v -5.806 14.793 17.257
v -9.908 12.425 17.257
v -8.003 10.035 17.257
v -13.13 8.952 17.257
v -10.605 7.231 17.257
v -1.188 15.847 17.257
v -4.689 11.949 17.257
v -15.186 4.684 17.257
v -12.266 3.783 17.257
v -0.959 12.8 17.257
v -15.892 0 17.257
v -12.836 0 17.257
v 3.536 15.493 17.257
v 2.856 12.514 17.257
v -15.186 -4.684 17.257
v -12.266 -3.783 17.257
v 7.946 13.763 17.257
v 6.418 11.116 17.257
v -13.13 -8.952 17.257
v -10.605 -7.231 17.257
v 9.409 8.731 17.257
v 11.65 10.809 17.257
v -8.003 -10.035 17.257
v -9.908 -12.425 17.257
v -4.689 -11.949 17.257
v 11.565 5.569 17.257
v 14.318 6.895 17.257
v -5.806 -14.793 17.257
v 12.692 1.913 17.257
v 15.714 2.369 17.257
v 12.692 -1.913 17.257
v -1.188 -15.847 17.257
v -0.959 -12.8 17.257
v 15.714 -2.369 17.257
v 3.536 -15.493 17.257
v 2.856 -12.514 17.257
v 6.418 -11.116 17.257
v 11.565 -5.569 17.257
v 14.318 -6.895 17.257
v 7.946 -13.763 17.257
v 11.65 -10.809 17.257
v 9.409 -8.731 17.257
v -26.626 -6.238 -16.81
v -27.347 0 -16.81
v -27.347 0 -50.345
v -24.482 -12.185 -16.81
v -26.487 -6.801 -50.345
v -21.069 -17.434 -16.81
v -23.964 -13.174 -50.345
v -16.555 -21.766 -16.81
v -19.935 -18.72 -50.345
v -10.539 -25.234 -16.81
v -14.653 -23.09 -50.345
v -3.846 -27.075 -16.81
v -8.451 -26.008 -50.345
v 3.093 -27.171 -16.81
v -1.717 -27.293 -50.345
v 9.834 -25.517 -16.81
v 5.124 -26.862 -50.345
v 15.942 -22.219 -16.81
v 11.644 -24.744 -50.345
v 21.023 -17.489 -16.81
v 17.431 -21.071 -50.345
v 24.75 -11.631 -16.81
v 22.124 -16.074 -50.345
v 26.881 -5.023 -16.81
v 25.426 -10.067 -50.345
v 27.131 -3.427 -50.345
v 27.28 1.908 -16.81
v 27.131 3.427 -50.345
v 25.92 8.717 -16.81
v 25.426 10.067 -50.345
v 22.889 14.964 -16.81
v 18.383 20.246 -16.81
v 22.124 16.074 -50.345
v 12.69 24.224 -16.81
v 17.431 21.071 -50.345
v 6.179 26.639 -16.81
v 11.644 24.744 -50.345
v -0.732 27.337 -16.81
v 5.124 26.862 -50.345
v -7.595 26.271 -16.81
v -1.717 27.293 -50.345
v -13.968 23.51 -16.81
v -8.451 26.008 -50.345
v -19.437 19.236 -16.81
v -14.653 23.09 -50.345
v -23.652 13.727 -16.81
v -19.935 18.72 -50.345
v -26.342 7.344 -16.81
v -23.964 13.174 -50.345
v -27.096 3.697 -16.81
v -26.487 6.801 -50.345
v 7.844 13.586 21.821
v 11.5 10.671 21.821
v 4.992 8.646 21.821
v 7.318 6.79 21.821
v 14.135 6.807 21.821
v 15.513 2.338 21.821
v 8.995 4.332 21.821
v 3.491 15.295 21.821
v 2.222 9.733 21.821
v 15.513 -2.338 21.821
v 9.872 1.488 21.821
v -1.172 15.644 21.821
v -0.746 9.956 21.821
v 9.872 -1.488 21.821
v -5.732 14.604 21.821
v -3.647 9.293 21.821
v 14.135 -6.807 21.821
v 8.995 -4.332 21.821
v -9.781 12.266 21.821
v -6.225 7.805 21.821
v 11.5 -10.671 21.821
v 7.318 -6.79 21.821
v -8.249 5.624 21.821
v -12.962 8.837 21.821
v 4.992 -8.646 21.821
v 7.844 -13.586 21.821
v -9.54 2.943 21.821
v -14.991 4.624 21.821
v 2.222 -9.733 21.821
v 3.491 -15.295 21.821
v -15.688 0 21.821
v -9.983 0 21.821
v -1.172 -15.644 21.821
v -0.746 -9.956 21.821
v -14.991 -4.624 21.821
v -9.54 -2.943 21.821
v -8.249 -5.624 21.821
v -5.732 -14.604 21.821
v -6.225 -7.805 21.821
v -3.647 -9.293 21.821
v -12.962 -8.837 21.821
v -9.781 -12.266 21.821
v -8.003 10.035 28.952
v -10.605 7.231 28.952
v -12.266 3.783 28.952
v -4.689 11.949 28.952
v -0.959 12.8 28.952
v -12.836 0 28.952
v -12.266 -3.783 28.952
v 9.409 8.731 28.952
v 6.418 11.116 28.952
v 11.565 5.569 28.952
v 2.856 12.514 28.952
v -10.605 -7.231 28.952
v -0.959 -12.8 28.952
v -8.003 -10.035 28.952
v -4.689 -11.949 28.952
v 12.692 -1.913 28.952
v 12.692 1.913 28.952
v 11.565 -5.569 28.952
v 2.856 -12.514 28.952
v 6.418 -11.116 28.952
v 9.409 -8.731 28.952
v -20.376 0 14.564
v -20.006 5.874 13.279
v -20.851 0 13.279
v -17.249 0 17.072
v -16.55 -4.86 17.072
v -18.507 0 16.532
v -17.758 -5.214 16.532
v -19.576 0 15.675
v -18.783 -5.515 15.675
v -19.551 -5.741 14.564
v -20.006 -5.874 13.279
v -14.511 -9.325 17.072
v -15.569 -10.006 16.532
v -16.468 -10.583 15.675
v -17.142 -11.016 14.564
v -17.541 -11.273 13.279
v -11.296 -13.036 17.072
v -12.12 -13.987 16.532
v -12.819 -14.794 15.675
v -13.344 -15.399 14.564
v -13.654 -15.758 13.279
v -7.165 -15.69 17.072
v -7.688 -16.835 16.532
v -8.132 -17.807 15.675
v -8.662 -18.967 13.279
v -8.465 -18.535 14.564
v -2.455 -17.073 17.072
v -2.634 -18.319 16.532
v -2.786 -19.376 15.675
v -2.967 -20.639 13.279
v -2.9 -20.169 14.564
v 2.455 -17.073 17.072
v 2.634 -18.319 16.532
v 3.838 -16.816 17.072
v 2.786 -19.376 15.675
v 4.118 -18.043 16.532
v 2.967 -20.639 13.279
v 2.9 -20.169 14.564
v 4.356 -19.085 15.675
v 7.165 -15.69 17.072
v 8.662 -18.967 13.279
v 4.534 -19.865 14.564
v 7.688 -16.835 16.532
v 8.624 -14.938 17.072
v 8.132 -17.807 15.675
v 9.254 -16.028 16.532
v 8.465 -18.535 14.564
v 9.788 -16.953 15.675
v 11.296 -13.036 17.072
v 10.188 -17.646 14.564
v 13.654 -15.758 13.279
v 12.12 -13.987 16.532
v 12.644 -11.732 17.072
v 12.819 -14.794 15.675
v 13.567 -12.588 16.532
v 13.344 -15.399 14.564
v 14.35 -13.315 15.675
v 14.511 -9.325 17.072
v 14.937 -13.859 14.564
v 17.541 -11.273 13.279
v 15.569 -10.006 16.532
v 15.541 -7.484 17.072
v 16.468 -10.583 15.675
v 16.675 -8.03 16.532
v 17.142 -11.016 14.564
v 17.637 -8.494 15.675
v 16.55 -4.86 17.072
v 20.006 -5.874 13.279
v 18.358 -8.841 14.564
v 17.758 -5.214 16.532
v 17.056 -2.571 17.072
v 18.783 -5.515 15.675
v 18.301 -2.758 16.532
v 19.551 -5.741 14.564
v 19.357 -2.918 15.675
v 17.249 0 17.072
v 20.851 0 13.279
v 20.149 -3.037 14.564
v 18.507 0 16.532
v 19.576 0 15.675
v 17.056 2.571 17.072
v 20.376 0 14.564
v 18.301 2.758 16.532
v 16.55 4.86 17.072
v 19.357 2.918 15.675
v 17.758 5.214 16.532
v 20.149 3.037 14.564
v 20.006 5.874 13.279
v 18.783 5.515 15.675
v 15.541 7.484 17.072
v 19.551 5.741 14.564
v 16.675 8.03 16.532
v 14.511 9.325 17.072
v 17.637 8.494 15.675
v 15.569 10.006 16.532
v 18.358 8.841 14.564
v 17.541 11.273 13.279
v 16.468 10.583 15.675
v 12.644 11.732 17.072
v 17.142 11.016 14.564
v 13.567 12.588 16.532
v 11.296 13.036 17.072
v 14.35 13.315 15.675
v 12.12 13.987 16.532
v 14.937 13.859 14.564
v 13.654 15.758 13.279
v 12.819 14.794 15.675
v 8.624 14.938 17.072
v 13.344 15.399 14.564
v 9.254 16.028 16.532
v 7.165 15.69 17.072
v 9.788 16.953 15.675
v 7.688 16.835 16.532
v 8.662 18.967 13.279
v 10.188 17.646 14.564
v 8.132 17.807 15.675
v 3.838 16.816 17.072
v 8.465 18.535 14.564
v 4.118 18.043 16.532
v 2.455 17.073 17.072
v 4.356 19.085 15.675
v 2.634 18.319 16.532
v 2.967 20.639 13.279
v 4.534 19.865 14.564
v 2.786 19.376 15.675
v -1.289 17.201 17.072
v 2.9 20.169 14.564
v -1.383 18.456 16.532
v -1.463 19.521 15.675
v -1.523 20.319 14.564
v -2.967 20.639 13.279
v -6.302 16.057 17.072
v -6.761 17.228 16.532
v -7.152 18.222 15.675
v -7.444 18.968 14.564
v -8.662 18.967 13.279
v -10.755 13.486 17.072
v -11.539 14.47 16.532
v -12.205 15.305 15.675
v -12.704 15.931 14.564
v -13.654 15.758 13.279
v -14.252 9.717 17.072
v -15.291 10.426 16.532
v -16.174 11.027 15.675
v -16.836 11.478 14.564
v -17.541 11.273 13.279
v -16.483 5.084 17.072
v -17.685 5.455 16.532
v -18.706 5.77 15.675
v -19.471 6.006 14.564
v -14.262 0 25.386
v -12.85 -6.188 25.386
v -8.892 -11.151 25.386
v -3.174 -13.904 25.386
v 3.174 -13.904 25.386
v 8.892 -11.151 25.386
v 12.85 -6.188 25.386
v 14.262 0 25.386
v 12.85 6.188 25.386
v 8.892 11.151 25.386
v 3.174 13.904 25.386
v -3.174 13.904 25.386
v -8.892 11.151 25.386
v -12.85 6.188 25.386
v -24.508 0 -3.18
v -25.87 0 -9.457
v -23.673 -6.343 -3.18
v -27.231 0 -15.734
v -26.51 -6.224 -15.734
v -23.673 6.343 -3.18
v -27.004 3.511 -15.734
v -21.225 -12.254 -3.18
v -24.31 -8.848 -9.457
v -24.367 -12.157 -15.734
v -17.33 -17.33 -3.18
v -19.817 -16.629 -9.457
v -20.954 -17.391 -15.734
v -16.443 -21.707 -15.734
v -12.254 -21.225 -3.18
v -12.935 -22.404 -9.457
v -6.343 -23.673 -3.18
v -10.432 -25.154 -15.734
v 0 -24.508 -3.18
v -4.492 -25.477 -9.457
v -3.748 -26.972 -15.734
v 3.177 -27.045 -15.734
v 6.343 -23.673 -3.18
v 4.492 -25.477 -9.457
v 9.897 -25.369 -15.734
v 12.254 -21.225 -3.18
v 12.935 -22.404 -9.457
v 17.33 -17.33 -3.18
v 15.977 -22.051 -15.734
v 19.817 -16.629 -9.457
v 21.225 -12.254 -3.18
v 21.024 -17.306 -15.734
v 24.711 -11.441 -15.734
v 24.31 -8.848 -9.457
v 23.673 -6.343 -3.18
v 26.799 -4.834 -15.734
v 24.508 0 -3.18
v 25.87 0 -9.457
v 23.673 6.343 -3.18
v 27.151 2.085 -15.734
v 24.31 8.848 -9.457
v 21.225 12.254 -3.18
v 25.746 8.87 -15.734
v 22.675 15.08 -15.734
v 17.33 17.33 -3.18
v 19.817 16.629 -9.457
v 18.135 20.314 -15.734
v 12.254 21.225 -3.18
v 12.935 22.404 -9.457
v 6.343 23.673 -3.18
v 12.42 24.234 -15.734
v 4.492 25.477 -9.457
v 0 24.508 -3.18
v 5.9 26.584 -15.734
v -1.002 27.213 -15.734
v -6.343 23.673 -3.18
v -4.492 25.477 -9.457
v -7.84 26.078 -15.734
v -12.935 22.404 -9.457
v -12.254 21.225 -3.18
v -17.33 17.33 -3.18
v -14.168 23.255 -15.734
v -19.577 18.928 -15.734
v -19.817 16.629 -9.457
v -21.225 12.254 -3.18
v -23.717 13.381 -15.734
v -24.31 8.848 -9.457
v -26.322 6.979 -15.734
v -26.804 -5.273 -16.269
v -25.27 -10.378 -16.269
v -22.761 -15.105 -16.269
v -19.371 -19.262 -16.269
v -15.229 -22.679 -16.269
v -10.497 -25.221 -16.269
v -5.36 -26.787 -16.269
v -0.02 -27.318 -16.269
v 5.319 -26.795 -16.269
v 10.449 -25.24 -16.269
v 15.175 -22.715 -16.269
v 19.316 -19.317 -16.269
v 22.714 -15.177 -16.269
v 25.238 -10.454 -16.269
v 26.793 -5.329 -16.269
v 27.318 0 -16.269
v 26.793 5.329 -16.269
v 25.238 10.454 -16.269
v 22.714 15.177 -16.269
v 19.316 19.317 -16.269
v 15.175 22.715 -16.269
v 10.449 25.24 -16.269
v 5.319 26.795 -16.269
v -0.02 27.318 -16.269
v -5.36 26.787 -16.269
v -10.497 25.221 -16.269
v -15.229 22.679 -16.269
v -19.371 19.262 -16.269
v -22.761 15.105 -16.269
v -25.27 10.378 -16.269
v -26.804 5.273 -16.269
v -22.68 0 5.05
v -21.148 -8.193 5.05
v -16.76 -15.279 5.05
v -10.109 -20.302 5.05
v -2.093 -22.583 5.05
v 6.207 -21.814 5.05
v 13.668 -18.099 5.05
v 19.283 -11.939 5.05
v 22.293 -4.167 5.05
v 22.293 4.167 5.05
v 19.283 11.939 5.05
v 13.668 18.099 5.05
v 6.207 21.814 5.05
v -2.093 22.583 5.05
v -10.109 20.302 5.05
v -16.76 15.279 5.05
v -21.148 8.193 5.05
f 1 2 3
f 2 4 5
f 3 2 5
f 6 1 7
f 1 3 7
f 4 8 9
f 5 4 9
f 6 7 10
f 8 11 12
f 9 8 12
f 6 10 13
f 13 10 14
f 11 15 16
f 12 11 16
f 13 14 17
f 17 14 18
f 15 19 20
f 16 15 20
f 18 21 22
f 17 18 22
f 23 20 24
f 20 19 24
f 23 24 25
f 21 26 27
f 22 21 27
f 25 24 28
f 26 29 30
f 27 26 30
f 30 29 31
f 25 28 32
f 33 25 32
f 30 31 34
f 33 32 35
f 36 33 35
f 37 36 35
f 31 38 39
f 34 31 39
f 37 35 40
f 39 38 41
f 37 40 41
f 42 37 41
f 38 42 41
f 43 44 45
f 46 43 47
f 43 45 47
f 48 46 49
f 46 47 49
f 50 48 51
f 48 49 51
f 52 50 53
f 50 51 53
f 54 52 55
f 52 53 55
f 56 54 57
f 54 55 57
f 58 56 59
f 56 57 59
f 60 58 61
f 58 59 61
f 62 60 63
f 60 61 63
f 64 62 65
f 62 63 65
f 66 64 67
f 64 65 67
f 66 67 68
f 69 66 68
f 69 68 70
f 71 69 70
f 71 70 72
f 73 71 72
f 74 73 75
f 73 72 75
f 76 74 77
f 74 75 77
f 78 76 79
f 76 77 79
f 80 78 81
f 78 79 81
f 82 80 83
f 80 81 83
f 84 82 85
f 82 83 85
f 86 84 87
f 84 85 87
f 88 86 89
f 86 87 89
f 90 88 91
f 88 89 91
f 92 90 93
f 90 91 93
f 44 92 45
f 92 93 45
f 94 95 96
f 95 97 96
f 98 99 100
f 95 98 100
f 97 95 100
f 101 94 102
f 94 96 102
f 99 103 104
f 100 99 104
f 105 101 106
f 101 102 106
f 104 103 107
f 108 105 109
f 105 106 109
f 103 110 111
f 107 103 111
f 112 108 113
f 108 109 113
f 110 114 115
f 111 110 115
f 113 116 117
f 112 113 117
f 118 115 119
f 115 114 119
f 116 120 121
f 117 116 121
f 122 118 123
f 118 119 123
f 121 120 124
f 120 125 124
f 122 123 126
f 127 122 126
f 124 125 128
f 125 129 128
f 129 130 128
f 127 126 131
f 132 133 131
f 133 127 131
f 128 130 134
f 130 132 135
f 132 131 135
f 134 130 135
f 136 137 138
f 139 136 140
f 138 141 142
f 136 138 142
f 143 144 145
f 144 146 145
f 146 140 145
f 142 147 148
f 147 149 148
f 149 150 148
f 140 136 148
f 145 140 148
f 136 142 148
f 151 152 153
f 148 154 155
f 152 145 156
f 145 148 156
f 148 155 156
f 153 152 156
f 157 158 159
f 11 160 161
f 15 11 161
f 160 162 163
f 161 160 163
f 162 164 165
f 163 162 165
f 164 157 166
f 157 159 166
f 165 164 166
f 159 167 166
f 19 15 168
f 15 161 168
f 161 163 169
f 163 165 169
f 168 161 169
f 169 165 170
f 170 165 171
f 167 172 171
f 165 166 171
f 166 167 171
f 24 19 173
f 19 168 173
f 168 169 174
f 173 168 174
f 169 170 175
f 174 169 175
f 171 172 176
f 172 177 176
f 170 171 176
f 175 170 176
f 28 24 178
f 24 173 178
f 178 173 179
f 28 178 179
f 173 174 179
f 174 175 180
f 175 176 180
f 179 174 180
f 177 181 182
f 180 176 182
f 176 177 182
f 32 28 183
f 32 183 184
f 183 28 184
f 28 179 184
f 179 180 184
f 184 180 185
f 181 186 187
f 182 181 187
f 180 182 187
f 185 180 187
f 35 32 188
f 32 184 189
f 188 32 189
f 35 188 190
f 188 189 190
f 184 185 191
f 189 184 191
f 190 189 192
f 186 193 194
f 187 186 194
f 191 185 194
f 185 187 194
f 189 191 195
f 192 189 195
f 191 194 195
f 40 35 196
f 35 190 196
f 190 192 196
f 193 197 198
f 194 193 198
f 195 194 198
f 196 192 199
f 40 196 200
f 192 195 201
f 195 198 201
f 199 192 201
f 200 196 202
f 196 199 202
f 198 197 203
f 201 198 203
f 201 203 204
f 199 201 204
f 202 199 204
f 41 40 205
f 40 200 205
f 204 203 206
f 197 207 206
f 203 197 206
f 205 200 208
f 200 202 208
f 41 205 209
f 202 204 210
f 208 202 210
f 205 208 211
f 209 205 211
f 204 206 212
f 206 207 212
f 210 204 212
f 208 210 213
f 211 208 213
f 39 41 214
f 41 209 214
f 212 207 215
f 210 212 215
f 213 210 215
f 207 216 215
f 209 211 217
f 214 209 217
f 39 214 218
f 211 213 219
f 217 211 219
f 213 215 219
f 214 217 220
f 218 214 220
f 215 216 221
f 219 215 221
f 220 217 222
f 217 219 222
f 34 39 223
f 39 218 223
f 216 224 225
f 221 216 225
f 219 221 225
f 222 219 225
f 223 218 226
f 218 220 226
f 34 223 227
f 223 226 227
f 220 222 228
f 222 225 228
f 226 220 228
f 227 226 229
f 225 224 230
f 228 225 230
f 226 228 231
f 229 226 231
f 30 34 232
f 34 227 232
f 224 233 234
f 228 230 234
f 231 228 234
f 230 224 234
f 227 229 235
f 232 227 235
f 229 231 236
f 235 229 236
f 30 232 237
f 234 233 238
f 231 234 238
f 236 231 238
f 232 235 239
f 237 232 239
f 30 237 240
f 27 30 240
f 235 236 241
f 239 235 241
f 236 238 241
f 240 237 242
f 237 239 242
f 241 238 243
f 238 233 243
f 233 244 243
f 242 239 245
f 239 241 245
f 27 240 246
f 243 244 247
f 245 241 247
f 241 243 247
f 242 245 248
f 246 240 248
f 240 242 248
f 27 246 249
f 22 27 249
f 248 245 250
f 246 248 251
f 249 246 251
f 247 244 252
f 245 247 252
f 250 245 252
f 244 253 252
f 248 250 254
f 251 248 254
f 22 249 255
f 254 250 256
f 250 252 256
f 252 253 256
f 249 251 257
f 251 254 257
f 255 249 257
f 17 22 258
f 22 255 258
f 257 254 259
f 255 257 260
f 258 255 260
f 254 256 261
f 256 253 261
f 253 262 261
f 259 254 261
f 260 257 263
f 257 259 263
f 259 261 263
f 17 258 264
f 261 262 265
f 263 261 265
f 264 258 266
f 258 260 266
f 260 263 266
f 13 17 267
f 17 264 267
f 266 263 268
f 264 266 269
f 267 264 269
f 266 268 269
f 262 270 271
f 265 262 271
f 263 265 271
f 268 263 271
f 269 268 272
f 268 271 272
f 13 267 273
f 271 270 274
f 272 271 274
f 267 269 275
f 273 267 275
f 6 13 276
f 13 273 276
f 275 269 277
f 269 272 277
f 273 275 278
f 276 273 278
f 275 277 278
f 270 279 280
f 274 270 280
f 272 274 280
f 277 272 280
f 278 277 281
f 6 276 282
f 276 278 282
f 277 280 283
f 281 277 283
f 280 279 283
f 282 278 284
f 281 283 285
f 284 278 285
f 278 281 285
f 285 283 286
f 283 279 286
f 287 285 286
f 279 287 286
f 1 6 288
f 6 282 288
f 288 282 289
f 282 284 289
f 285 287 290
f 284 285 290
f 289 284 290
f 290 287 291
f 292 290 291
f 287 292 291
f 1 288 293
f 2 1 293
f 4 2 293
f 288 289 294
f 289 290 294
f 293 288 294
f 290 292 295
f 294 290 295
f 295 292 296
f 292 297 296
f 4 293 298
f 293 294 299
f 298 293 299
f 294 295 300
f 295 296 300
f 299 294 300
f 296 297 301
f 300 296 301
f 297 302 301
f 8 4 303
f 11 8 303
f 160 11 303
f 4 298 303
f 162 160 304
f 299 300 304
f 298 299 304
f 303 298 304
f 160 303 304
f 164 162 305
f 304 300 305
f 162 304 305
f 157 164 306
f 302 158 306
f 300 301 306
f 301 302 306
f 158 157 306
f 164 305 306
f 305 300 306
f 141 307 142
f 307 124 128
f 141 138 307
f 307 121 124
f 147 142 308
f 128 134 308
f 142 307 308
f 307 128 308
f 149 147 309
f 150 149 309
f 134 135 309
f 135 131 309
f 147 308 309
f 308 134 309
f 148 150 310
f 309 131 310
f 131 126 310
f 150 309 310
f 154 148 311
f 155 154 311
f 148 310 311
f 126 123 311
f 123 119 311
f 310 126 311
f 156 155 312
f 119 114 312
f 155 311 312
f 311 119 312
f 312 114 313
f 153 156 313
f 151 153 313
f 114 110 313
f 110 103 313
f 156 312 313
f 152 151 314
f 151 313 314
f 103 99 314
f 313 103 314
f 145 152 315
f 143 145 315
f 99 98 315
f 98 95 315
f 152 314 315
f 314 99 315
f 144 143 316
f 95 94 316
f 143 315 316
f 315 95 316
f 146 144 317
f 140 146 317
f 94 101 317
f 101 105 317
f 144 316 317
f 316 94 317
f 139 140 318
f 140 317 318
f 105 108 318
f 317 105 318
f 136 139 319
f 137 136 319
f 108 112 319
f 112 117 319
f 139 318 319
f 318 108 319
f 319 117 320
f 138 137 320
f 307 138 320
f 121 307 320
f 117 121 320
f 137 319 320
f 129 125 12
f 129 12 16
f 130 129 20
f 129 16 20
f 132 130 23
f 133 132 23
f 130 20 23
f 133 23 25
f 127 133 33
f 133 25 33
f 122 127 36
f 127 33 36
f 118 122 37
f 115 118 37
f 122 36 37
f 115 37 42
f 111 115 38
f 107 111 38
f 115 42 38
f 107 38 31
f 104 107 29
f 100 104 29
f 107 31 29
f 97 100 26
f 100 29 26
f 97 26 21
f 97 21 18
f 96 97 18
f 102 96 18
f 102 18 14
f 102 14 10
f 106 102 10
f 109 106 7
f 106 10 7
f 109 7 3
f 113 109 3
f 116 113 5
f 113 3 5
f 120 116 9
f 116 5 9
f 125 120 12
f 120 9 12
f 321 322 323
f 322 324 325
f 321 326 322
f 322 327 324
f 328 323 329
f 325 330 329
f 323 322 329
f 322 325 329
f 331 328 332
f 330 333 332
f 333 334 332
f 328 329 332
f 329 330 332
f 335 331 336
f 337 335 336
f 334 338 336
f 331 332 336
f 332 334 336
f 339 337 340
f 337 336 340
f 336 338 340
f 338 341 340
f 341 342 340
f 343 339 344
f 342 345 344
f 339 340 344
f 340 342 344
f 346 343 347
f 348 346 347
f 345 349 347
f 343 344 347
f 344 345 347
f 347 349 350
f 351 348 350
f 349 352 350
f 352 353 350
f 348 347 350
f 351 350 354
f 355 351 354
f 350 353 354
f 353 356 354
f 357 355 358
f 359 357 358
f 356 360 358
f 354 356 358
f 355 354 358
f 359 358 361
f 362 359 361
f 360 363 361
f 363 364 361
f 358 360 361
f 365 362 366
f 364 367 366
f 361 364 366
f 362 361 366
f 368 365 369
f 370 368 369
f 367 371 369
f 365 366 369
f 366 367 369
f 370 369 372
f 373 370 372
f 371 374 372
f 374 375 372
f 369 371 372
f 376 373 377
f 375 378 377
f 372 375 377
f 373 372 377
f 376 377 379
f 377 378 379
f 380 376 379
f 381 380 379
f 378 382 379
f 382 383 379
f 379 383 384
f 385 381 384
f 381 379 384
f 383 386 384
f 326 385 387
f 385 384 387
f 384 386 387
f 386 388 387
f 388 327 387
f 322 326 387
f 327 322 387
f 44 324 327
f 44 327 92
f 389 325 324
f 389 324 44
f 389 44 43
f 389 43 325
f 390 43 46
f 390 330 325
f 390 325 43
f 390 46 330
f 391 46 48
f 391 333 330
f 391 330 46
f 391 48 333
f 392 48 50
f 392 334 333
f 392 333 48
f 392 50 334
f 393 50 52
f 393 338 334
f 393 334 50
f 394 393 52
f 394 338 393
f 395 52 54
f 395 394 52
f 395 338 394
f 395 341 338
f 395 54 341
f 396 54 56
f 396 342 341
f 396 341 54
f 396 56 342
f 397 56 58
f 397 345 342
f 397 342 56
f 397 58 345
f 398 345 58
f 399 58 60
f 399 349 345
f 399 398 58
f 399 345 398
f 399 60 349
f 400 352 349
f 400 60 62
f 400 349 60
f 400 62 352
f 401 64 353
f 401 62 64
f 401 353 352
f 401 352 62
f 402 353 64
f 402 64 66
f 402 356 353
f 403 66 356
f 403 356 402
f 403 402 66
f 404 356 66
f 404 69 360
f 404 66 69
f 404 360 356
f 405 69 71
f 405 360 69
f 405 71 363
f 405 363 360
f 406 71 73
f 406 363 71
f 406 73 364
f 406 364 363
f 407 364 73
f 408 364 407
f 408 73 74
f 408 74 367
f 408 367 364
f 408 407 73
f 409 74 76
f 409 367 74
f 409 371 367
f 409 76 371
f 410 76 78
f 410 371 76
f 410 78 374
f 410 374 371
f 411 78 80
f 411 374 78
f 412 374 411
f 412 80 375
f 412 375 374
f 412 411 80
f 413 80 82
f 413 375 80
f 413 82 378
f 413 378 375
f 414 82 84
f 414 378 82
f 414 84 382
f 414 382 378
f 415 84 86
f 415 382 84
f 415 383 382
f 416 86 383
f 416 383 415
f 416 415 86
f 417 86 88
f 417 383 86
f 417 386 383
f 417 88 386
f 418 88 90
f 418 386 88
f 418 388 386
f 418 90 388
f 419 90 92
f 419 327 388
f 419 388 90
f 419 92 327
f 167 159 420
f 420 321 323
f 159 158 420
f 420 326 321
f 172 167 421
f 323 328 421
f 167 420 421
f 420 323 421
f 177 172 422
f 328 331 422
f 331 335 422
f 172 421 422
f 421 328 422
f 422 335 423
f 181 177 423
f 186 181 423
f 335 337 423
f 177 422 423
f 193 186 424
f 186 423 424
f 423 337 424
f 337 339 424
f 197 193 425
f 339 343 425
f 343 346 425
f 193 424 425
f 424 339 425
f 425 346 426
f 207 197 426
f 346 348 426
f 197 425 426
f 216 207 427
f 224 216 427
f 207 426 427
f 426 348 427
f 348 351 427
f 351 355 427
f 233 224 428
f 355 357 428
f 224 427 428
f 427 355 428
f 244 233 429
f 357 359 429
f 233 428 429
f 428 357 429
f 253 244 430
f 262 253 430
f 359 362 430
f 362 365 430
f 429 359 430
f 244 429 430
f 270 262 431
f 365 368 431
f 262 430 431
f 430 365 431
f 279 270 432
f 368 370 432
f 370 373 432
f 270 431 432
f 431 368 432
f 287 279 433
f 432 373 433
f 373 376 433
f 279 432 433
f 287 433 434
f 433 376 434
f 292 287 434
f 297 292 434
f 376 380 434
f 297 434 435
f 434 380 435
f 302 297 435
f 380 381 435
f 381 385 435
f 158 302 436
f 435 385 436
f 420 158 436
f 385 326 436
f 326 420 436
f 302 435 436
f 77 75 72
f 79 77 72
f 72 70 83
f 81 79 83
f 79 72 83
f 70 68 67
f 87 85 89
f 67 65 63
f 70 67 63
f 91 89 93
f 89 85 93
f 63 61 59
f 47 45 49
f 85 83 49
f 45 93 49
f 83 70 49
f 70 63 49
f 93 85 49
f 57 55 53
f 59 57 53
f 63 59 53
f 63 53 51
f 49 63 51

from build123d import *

# Parameters (mm, degrees)
F2_R = 5.08
F3_R = 5.08


with BuildPart() as f1:
    # F0 (on Front) → F1 (revolve)
    with BuildSketch(Plane.XZ):
        Polygon((0, -50.344978), (0, 28.951926), (-12.835828, 28.951926), (-15.688237, 21.82091), (-9.983422, 21.82091), (-12.835828, 17.257059), (-19.966844, 17.257059), (-24.508418, -3.180023), (-27.346618, -16.265895), (-27.346618, -50.344978), align=None)
    revolve(axis=Axis((0, 0, -10.696526), (0, 0, 1)))

    # F2
    f2_edges = [f1.edges().sort_by_distance(p)[0] for p in [
        (19.966844, 0, 17.257059),
        (24.508418, 0, -3.180023),
        (-22.237631, 0, 7.038518),
    ]]
    fillet(f2_edges, radius=F2_R)

    # F3
    f3_edges = [f1.edges().sort_by_distance(p)[0] for p in [
        (27.346618, 0, -16.265895),
    ]]
    fillet(f3_edges, radius=F3_R)


solid = f1.part
